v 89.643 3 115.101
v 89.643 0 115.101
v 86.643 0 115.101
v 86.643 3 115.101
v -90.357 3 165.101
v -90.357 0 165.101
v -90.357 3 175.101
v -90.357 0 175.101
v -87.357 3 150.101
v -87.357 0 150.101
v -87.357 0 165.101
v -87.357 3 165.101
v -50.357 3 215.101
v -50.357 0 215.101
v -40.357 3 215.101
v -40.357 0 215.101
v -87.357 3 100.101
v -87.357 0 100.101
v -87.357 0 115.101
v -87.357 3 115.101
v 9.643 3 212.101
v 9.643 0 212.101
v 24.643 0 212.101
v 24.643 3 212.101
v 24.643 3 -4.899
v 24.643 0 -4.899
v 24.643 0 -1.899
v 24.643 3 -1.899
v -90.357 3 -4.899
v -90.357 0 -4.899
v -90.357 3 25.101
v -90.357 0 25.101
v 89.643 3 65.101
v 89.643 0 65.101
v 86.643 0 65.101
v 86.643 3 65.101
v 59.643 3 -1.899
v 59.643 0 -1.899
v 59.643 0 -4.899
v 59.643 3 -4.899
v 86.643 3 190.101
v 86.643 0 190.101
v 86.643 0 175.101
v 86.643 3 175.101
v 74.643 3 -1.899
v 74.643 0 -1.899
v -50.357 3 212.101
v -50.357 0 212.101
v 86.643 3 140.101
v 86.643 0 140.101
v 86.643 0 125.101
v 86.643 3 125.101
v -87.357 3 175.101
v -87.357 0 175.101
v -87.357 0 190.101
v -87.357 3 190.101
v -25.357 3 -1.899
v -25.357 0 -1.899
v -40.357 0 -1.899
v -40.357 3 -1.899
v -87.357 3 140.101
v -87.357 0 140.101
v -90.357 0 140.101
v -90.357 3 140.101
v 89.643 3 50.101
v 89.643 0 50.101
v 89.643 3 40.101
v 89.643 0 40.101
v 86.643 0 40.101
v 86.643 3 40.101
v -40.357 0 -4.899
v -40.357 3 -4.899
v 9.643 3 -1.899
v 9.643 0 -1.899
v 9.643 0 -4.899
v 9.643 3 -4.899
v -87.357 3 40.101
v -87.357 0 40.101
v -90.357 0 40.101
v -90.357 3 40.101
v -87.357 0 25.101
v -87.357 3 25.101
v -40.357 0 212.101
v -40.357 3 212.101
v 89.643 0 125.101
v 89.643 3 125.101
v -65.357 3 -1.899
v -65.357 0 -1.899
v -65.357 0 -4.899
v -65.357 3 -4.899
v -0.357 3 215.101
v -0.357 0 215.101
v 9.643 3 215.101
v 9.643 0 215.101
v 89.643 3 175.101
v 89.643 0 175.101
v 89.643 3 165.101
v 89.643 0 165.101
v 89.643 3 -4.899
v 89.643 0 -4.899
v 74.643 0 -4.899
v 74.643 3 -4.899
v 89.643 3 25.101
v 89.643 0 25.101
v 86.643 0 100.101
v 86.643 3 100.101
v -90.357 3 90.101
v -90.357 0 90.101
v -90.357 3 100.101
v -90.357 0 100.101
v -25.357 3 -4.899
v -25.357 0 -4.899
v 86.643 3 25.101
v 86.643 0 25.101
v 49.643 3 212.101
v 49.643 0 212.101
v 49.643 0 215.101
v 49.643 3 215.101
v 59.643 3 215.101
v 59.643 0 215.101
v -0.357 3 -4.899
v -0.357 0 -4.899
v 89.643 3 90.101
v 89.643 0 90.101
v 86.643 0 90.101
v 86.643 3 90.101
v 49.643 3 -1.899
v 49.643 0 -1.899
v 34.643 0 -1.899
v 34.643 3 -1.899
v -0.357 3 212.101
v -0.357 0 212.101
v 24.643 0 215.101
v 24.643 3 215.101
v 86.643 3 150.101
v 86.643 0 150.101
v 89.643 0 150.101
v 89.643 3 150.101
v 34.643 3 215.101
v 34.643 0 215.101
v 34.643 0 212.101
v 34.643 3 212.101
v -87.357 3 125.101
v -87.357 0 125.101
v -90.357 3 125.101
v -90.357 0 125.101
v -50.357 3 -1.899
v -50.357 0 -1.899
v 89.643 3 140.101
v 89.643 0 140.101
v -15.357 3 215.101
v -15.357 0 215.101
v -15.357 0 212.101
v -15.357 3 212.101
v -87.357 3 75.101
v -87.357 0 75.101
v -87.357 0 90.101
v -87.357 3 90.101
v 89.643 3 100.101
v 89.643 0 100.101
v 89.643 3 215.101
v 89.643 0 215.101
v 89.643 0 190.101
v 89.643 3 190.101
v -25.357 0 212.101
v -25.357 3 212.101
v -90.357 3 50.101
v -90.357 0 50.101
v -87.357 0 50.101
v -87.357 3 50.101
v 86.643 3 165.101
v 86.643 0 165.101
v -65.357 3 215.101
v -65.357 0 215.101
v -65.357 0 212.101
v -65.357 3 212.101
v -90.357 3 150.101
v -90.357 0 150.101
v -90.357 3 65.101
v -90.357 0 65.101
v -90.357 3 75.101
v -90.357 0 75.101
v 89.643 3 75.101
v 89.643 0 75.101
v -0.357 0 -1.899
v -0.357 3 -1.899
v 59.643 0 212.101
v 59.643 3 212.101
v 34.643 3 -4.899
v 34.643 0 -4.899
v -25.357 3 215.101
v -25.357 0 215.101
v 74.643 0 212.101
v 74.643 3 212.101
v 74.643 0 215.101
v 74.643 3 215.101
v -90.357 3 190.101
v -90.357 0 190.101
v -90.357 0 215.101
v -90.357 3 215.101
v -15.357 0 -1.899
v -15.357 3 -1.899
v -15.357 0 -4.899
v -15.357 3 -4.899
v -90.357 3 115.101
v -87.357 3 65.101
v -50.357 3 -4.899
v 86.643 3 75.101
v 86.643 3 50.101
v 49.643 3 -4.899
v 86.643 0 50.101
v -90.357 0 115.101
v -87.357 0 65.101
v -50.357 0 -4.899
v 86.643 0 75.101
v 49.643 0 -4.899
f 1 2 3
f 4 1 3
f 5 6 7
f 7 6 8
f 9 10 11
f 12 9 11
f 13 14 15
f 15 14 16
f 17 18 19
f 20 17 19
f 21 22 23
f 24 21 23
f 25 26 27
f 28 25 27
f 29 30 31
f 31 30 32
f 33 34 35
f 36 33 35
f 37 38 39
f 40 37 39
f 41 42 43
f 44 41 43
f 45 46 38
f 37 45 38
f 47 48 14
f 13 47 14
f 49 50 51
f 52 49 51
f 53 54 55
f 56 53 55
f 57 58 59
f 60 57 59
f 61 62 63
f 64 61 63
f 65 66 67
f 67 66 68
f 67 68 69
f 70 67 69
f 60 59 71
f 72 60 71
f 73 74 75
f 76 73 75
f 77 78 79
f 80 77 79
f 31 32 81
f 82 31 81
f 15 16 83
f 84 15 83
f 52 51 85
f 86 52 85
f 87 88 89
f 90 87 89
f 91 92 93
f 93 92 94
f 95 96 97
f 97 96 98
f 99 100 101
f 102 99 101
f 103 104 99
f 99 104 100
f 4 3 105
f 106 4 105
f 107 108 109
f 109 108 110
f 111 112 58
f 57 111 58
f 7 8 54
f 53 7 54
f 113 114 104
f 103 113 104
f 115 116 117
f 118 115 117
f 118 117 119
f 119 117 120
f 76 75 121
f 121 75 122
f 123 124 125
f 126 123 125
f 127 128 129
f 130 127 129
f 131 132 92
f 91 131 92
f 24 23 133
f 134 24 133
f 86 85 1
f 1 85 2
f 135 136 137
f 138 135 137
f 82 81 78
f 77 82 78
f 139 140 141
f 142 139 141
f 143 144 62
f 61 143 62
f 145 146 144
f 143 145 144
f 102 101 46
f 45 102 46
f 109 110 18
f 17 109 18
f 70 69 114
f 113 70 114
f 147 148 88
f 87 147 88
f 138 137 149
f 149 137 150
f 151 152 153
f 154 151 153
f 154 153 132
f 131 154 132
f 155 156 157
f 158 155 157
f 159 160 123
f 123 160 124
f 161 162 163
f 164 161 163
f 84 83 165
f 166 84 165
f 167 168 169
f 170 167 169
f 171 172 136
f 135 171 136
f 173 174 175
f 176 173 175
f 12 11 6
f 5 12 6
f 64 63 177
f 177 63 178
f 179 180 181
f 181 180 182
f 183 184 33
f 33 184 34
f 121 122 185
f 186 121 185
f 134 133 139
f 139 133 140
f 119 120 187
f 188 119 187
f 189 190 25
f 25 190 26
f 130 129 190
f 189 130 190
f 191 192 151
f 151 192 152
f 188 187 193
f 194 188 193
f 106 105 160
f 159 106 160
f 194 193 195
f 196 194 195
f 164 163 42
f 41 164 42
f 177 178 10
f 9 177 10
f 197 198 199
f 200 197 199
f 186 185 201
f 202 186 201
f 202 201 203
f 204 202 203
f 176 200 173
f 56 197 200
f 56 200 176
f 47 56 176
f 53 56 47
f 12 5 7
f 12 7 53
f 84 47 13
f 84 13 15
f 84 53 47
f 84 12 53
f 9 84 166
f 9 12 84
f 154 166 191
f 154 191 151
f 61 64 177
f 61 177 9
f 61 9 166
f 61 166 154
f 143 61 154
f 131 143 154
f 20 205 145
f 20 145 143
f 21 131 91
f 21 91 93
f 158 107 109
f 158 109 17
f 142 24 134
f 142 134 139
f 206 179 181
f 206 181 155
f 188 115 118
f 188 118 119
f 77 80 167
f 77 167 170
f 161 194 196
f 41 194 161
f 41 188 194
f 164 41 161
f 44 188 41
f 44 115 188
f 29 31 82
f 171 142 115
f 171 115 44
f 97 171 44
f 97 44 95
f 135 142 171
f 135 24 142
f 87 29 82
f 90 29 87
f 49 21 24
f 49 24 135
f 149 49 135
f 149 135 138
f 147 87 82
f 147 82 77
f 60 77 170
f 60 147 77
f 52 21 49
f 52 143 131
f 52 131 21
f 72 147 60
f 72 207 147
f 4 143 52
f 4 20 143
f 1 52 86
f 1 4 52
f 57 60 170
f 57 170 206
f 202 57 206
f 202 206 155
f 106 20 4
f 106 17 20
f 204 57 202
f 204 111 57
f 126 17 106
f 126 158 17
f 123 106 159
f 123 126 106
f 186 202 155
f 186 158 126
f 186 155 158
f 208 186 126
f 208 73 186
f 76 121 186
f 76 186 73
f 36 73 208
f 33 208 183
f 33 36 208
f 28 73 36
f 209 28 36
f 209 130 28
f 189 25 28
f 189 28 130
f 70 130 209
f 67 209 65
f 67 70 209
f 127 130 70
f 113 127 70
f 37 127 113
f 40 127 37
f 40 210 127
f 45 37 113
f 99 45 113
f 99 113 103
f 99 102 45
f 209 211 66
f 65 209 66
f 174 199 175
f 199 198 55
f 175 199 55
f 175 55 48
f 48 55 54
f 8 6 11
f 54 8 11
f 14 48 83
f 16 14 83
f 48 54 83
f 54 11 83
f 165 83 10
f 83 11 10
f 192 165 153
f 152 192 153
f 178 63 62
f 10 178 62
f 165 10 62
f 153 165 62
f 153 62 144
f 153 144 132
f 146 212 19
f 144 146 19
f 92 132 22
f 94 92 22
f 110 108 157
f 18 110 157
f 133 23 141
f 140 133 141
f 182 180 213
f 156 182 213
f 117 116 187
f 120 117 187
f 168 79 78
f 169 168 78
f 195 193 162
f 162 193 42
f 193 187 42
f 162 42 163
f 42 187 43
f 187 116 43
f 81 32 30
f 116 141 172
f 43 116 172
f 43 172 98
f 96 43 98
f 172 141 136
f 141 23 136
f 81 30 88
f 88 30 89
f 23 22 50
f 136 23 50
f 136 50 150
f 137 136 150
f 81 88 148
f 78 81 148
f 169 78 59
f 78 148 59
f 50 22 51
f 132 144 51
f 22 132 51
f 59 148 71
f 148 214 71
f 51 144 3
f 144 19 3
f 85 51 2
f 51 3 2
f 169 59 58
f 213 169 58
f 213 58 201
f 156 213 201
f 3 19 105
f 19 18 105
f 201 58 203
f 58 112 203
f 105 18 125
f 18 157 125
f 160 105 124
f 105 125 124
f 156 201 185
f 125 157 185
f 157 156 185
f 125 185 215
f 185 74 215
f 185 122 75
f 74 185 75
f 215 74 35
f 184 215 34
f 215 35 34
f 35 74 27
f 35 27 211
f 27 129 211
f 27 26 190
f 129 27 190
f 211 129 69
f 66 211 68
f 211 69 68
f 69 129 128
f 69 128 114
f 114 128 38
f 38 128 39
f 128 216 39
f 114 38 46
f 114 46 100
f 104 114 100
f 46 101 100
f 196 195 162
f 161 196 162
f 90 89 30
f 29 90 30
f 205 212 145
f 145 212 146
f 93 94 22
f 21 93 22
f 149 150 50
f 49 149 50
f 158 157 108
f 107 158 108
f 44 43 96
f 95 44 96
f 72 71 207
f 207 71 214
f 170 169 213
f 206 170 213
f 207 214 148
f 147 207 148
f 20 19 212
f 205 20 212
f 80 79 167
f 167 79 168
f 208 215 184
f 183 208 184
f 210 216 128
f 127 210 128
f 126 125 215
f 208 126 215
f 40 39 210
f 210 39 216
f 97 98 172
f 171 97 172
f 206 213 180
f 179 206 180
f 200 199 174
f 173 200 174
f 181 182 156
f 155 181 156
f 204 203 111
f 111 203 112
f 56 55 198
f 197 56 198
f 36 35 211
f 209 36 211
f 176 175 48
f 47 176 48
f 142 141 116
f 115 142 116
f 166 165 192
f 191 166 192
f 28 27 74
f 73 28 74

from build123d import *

# Parameters (mm, degrees)
BOSS_EXTRUDE1_DEPTH = 3


with BuildPart() as part:
    # Sketch1 → Boss-Extrude1 (new body)
    with BuildSketch(Plane(origin=(0, 0, 0), x_dir=(1, 0, 0), z_dir=(0, 1, 0))):
        Polygon((-87.356947197, -190.101323735), (-90.356947197, -190.101323735), (-90.356947197, -215.101323735), (-65.356947197, -215.101323735), (-65.356947197, -212.101323735), (-50.356947197, -212.101323735), (-50.356947197, -215.101323735), (-40.356947197, -215.101323735), (-40.356947197, -212.101323735), (-25.356947197, -212.101323735), (-25.356947197, -215.101323735), (-15.356947197, -215.101323735), (-15.356947197, -212.101323735), (-0.356947197, -212.101323735), (-0.356947197, -215.101323735), (9.643052803, -215.101323735), (9.643052803, -212.101323735), (24.643052803, -212.101323735), (24.643052803, -215.101323735), (34.643052803, -215.101323735), (34.643052803, -212.101323735), (49.643052803, -212.101323735), (49.643052803, -215.101323735), (59.643052803, -215.101323735), (59.643052803, -212.101323735), (74.643052803, -212.101323735), (74.643052803, -215.101323735), (89.643052803, -215.101323735), (89.643052803, -190.101323735), (86.643052803, -190.101323735), (86.643052803, -175.101323735), (89.643052803, -175.101323735), (89.643052803, -165.101323735), (86.643052803, -165.101323735), (86.643052803, -150.101323735), (89.643052803, -150.101323735), (89.643052803, -140.101323735), (86.643052803, -140.101323735), (86.643052803, -125.101323735), (89.643052803, -125.101323735), (89.643052803, -115.101323735), (86.643052803, -115.101323735), (86.643052803, -100.101323735), (89.643052803, -100.101323735), (89.643052803, -90.101323735), (86.643052803, -90.101323735), (86.643052803, -75.101323735), (89.643052803, -75.101323735), (89.643052803, -65.101323735), (86.643052803, -65.101323735), (86.643052803, -50.101323735), (89.643052803, -50.101323735), (89.643052803, -40.101323735), (86.643052803, -40.101323735), (86.643052803, -25.101323735), (89.643052803, -25.101323735), (89.643052803, 4.898676265), (74.643052803, 4.898676265), (74.643052803, 1.898676265), (59.643052803, 1.898676265), (59.643052803, 4.898676265), (49.643052803, 4.898676265), (49.643052803, 1.898676265), (34.643052803, 1.898676265), (34.643052803, 4.898676265), (24.643052803, 4.898676265), (24.643052803, 1.898676265), (9.643052803, 1.898676265), (9.643052803, 4.898676265), (-0.356947197, 4.898676265), (-0.356947197, 1.898676265), (-15.356947197, 1.898676265), (-15.356947197, 4.898676265), (-25.356947197, 4.898676265), (-25.356947197, 1.898676265), (-40.356947197, 1.898676265), (-40.356947197, 4.898676265), (-50.356947197, 4.898676265), (-50.356947197, 1.898676265), (-65.356947197, 1.898676265), (-65.356947197, 4.898676265), (-90.356947197, 4.898676265), (-90.356947197, -25.101323735), (-87.356947197, -25.101323735), (-87.356947197, -40.101323735), (-90.356947197, -40.101323735), (-90.356947197, -50.101323735), (-87.356947197, -50.101323735), (-87.356947197, -65.101323735), (-90.356947197, -65.101323735), (-90.356947197, -75.101323735), (-87.356947197, -75.101323735), (-87.356947197, -90.101323735), (-90.356947197, -90.101323735), (-90.356947197, -100.101323735), (-87.356947197, -100.101323735), (-87.356947197, -115.101323735), (-90.356947197, -115.101323735), (-90.356947197, -125.101323735), (-87.356947197, -125.101323735), (-87.356947197, -140.101323735), (-90.356947197, -140.101323735), (-90.356947197, -150.101323735), (-87.356947197, -150.101323735), (-87.356947197, -165.101323735), (-90.356947197, -165.101323735), (-90.356947197, -175.101323735), (-87.356947197, -175.101323735), align=None)
    extrude(amount=BOSS_EXTRUDE1_DEPTH)


solid = part.part
